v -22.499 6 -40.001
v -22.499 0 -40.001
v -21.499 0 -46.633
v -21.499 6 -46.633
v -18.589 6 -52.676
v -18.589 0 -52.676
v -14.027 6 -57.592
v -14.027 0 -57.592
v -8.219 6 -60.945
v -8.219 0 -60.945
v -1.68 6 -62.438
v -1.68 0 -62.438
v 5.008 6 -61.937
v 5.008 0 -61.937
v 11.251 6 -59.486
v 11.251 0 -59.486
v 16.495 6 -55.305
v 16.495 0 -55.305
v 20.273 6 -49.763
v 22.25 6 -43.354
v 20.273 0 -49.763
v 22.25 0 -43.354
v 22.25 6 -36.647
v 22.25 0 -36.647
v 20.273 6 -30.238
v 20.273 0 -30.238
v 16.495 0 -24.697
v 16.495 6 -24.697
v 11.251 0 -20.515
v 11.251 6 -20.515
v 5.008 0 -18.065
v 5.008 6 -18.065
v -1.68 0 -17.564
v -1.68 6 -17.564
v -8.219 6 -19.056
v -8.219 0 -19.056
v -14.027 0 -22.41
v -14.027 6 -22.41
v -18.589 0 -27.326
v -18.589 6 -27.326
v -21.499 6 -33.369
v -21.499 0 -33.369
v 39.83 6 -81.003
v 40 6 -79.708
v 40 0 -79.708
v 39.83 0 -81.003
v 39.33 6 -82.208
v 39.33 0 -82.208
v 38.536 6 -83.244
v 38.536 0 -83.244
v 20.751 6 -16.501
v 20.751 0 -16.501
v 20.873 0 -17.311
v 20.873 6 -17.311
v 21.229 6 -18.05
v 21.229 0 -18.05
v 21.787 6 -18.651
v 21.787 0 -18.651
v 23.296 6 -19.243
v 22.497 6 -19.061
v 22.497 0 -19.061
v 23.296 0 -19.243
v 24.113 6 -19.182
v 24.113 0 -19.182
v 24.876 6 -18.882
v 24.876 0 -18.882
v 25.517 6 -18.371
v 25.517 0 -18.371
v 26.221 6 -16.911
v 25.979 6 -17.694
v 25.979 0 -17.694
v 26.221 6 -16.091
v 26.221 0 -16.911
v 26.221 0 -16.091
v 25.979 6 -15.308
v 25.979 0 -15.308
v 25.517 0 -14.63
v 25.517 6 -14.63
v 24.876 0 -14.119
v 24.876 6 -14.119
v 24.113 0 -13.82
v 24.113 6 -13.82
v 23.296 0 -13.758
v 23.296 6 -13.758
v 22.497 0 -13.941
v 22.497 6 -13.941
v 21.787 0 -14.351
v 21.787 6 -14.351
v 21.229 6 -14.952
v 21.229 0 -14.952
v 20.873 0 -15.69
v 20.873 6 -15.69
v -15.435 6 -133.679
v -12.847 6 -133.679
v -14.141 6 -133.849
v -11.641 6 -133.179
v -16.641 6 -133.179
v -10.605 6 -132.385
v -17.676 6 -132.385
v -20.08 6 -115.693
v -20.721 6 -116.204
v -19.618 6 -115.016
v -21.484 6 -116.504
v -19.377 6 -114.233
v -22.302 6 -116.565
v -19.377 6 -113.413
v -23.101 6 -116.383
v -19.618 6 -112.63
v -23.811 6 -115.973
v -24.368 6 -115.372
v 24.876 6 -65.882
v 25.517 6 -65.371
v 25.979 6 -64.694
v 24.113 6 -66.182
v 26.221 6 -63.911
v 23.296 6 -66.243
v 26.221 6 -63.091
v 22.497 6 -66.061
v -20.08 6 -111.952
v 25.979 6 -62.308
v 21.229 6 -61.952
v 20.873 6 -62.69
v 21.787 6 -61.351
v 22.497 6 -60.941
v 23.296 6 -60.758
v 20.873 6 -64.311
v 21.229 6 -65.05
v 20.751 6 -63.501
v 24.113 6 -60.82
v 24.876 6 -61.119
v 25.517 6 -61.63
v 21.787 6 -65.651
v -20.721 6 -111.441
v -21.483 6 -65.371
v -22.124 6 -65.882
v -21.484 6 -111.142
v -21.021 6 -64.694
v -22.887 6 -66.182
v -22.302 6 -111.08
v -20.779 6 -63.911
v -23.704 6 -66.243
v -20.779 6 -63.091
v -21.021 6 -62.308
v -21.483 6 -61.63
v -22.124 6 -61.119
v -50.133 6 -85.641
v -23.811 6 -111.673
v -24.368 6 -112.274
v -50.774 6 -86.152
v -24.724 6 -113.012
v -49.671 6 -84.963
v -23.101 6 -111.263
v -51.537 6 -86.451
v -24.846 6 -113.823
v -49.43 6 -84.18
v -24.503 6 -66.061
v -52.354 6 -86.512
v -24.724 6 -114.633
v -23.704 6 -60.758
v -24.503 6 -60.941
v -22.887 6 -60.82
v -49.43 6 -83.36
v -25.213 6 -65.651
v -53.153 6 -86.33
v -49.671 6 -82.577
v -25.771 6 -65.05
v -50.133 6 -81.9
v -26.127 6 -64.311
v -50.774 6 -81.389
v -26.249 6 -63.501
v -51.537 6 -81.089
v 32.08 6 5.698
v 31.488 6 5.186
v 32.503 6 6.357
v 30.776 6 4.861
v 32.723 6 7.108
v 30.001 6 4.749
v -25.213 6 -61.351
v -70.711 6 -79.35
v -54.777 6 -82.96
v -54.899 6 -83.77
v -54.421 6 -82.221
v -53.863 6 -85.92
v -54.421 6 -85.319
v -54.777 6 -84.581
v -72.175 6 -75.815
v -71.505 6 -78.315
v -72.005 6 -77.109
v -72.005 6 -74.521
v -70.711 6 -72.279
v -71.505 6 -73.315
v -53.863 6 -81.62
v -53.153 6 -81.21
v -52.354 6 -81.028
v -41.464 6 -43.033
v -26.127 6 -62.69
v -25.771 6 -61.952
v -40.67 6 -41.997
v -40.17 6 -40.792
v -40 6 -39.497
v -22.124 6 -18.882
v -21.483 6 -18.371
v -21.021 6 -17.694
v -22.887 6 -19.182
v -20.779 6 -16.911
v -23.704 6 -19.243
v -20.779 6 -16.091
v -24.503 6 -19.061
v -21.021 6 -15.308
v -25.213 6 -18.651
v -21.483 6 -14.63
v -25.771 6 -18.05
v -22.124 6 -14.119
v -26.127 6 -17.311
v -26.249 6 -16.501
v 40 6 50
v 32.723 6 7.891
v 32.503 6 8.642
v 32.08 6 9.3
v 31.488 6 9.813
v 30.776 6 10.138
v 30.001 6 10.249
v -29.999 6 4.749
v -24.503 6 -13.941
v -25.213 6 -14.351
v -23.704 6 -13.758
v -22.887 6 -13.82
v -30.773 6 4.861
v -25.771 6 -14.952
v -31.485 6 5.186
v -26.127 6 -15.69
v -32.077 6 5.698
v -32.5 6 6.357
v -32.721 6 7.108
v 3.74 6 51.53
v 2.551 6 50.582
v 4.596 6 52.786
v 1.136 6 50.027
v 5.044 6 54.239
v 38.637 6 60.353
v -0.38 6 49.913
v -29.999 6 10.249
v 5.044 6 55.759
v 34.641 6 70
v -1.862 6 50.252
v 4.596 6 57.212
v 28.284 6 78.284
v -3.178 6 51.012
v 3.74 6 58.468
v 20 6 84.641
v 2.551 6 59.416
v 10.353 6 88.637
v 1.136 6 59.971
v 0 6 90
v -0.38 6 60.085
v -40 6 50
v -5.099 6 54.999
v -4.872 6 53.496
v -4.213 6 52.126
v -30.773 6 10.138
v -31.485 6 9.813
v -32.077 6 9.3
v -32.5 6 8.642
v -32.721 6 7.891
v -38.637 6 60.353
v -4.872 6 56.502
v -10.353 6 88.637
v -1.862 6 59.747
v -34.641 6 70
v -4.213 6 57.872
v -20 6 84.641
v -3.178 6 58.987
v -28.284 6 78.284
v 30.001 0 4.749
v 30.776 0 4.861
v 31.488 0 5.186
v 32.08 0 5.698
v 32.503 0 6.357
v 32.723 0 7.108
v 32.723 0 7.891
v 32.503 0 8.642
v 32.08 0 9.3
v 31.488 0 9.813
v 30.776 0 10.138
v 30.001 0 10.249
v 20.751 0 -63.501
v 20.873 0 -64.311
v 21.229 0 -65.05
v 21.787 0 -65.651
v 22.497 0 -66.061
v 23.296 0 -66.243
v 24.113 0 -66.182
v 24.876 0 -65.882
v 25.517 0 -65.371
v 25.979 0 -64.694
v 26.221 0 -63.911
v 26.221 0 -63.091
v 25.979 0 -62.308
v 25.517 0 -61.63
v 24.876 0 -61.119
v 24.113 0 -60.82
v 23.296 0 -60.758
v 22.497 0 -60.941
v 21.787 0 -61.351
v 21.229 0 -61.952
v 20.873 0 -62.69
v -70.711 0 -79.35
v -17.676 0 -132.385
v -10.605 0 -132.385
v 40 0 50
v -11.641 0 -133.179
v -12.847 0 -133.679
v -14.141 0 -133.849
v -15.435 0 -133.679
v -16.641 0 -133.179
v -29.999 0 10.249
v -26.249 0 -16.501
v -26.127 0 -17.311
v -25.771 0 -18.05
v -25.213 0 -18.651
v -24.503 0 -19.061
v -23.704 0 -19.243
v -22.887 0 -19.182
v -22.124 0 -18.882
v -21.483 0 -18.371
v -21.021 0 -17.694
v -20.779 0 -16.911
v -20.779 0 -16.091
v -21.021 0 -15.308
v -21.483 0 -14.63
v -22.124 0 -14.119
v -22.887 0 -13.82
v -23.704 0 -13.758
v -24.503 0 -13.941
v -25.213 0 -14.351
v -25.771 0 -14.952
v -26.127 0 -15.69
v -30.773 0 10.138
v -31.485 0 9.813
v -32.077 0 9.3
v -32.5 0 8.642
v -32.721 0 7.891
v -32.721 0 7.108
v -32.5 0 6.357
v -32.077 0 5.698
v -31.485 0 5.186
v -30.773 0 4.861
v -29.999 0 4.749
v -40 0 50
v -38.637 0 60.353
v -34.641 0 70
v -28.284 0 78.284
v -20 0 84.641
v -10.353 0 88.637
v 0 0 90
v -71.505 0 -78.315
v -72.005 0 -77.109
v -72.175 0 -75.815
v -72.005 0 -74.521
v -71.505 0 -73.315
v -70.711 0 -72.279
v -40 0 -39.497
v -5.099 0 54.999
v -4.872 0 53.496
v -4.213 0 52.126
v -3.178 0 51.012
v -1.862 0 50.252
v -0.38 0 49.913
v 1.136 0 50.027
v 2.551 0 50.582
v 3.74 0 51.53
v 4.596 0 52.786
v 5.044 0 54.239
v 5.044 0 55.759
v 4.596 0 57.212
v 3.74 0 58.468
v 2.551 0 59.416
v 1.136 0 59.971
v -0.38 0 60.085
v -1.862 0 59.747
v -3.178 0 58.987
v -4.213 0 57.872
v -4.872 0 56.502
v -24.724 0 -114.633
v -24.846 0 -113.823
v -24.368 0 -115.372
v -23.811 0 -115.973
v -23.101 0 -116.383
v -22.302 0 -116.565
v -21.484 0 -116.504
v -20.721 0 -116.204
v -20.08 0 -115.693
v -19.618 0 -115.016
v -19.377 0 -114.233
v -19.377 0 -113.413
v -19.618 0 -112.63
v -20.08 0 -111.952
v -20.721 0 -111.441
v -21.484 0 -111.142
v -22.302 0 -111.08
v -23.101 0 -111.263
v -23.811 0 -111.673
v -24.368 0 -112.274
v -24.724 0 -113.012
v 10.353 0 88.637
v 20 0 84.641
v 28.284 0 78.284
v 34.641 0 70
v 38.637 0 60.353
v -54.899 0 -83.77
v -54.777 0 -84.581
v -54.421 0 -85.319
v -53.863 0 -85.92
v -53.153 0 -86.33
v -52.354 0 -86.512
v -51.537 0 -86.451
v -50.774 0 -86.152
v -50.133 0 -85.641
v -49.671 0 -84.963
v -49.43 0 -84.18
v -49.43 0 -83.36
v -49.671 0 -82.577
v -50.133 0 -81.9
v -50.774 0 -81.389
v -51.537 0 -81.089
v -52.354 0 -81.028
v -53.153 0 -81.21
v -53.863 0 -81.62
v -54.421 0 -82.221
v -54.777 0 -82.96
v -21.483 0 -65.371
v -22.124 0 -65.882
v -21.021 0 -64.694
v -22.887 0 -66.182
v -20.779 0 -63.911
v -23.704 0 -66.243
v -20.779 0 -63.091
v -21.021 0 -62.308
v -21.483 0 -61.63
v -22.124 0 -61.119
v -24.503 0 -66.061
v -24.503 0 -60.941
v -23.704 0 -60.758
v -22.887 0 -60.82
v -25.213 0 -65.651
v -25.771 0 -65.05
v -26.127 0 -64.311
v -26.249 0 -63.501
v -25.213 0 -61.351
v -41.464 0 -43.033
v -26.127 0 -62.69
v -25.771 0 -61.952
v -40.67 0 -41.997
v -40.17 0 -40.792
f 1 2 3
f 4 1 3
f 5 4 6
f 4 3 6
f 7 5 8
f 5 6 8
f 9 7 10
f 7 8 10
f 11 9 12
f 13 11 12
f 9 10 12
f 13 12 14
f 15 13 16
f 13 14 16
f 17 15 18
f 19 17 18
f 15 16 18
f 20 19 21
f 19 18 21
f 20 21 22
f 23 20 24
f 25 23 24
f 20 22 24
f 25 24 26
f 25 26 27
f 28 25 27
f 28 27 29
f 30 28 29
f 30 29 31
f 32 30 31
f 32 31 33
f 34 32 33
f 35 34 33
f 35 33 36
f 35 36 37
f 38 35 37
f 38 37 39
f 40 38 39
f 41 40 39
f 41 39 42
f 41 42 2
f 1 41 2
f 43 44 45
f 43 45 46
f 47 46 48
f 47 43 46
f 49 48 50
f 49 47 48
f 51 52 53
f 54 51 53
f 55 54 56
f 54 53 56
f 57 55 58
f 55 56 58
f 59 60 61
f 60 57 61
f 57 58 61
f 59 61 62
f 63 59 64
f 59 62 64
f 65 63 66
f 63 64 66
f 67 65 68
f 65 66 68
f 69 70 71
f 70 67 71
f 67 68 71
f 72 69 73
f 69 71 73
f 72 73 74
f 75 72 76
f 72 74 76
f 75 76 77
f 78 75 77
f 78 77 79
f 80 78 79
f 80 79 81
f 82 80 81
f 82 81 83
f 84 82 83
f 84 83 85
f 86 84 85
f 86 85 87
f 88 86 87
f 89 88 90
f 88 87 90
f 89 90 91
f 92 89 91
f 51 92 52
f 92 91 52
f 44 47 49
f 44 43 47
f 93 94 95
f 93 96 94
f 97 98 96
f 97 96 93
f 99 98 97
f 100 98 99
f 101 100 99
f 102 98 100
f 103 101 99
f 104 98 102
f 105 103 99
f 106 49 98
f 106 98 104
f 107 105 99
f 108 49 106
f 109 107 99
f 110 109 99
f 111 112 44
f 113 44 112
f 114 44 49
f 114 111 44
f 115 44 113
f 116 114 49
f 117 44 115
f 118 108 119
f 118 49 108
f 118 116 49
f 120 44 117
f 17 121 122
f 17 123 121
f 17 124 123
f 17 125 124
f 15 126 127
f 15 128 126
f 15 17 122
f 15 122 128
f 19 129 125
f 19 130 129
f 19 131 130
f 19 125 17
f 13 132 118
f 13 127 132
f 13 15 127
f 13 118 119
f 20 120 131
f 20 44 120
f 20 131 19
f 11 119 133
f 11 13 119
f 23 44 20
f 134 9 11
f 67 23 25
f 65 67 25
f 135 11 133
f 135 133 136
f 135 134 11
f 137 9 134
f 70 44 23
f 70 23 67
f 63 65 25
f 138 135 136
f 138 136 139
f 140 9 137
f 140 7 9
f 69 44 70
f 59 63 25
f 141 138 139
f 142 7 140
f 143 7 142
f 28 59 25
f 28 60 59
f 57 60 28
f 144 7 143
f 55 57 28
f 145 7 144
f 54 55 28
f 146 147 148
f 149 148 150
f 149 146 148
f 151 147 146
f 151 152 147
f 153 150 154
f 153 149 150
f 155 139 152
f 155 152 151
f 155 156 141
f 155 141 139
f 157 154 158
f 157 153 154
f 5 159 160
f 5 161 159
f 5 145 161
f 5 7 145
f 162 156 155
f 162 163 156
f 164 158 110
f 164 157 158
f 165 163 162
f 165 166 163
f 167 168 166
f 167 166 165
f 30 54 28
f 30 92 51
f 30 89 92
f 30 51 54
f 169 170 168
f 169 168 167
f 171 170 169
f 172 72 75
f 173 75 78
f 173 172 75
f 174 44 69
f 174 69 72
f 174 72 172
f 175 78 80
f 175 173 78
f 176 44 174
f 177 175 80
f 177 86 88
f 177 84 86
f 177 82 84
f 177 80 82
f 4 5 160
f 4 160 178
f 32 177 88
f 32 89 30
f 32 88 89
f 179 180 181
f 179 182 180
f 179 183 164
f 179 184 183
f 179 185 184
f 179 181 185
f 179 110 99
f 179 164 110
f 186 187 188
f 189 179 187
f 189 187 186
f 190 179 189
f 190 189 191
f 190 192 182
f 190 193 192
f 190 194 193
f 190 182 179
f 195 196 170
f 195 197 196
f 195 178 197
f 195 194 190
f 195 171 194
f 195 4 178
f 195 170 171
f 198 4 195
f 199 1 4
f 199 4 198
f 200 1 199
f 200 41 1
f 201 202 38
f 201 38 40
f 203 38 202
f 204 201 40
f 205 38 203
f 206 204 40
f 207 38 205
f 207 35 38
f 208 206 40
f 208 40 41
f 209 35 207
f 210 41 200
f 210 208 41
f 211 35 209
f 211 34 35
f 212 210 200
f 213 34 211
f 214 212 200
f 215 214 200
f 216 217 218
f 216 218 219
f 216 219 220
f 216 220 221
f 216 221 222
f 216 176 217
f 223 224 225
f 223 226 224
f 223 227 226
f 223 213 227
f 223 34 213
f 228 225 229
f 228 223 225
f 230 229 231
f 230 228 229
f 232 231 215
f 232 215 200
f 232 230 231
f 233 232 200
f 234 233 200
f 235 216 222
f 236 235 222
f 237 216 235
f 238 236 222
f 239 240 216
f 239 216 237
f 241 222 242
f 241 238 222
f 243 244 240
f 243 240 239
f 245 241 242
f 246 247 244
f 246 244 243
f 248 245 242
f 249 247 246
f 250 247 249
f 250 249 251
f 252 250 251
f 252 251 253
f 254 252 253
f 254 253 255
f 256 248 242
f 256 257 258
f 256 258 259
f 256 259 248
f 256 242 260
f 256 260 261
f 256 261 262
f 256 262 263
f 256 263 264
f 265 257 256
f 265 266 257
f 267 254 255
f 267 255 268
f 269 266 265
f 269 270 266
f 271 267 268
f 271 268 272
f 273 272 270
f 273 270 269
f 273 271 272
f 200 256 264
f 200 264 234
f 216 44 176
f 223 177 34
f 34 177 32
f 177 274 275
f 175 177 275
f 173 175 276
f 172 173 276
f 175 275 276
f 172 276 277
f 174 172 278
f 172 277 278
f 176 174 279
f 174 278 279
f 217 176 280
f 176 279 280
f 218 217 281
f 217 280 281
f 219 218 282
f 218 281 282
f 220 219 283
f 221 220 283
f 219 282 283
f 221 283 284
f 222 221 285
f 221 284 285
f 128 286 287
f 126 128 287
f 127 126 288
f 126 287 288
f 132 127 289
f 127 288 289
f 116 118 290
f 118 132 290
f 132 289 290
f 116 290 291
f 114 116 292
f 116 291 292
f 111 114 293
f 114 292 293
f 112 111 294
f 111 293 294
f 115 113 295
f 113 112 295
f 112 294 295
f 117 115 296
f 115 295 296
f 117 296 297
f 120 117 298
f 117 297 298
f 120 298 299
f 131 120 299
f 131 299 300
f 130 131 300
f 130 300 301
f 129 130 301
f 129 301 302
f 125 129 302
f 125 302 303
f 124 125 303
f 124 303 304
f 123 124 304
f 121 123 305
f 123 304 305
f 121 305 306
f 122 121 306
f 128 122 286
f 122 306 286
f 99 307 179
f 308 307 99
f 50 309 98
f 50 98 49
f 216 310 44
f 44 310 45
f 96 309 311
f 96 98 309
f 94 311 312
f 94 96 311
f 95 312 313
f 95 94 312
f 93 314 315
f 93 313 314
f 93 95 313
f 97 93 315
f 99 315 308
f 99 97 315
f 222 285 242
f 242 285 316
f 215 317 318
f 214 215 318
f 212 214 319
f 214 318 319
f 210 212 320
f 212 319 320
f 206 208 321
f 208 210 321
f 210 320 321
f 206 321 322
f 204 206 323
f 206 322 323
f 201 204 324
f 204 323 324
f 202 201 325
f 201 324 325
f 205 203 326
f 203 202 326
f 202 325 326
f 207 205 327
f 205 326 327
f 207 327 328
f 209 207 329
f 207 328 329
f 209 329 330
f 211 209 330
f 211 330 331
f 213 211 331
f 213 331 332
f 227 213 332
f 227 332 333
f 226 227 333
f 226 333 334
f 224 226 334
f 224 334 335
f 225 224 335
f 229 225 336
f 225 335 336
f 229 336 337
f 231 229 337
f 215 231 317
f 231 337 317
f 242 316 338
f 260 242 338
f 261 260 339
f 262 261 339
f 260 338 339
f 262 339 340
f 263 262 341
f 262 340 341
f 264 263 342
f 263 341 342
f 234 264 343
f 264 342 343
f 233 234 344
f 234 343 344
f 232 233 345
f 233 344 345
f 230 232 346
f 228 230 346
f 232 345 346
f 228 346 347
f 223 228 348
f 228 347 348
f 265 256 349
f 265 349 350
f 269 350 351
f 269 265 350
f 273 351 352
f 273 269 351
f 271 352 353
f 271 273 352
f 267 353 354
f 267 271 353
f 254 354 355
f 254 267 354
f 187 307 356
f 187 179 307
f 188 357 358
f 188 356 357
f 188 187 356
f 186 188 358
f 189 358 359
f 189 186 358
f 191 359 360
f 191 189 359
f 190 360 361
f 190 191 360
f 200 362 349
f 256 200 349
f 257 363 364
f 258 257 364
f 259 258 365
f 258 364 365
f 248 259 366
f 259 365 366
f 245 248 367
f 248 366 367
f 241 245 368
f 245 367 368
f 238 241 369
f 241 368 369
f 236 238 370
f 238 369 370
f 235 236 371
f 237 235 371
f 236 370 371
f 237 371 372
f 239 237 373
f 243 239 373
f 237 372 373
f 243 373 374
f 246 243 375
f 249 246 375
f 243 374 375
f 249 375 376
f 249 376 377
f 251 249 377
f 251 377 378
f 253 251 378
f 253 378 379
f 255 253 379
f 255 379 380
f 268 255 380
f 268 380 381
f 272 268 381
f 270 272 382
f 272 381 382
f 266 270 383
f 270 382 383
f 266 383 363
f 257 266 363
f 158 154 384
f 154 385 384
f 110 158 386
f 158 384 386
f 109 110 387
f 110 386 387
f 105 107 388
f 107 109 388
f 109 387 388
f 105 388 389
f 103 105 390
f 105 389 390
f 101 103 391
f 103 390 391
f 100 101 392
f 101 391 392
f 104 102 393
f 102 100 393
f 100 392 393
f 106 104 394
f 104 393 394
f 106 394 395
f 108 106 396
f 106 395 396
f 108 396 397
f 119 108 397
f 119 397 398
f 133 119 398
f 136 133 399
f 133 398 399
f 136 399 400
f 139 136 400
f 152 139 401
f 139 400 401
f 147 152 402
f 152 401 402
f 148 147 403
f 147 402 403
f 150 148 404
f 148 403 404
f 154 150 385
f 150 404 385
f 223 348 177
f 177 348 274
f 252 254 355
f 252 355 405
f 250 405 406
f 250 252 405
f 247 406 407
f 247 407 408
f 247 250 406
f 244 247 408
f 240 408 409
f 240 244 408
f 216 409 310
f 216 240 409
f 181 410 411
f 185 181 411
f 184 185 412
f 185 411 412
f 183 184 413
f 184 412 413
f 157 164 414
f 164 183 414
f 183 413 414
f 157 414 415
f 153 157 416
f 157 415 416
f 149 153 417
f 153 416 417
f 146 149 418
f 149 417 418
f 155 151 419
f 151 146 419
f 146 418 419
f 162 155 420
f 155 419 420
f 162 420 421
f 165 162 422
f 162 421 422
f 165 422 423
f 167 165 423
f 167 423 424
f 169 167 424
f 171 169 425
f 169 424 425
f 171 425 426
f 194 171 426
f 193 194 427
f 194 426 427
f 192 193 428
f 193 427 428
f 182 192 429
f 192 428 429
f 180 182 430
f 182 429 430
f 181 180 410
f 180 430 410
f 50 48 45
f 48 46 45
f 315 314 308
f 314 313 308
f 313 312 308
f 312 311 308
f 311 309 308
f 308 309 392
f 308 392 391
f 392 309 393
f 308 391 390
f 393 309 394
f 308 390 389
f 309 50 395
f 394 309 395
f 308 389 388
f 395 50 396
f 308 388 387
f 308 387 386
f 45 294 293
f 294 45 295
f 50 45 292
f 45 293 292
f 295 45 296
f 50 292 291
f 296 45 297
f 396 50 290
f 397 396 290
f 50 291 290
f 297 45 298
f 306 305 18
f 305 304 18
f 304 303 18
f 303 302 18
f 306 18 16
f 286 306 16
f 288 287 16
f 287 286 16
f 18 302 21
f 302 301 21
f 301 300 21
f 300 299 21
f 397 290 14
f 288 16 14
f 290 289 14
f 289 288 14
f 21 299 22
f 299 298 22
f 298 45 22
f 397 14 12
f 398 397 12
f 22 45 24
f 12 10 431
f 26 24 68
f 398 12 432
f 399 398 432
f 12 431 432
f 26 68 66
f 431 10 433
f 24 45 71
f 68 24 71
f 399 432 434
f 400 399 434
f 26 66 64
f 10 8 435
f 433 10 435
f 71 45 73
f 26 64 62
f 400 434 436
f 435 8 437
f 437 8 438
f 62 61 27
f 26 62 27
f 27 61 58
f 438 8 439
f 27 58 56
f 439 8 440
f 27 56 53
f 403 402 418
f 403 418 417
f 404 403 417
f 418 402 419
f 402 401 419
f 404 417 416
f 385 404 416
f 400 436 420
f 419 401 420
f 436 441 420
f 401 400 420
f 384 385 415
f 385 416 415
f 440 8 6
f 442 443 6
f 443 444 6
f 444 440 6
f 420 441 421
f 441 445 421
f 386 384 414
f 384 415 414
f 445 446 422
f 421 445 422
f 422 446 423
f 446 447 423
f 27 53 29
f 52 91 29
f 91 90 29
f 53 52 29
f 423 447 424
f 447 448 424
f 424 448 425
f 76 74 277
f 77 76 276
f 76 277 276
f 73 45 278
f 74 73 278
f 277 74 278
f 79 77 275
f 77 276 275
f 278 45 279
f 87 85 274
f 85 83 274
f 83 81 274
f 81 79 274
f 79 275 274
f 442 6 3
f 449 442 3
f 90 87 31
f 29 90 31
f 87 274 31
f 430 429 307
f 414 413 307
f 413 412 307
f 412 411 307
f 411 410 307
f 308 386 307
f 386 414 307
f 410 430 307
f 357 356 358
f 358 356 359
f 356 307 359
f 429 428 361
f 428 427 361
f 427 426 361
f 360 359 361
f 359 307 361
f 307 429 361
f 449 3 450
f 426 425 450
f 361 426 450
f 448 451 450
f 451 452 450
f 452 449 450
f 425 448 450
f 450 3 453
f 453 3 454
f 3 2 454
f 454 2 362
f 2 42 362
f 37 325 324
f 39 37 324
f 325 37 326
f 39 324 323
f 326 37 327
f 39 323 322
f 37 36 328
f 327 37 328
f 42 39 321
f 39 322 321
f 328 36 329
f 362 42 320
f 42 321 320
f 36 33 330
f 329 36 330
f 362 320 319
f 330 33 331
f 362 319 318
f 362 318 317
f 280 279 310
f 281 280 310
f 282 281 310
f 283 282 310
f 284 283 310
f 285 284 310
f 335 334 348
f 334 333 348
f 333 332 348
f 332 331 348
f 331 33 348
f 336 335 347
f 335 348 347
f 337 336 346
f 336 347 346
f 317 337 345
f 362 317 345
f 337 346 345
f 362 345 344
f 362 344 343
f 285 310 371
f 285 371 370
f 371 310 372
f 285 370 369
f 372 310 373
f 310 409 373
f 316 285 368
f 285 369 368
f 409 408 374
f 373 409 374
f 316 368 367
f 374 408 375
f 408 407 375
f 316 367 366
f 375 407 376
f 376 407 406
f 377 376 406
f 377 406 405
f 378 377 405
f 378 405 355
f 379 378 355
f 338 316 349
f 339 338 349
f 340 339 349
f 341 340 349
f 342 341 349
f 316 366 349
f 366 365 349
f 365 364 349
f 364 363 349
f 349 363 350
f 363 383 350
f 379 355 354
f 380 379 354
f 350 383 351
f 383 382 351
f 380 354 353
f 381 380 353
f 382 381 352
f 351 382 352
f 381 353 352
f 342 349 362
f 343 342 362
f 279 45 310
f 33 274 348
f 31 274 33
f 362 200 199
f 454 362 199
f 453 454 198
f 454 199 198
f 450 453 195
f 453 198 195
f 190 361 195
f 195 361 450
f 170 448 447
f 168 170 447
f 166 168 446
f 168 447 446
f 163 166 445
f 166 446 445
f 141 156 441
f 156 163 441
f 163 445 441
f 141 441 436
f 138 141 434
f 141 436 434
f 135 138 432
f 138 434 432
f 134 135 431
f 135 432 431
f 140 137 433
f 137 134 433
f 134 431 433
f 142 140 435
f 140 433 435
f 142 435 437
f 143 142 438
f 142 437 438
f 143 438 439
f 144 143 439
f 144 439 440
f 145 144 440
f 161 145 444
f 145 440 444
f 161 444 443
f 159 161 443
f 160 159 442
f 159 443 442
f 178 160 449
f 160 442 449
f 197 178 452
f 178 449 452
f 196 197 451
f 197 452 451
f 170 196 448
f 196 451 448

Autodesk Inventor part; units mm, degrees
ref_plane "YZ Plane" through (0, 0, 0) normal (1, 0, 0) x (0, 1, 0)
ref_plane "XZ Plane" through (0, 0, 0) normal (0, 1, 0) x (-1, 0, 0)
sketch "Sketch1" plane through (0, 0, 0) normal (0, 1, 0) x (-1, 0, 0)
  line L0 (40, 90) -> (-40, 90)
  line L1 (-40, 90) -> (-40, -81.7795)
  line L2 (40, -41.5685) -> (40, 90)
  line L3 (40, 90) -> (-40, -90) construction
  line L4 (-40, 90) -> (40, -90) construction
  circle A0 centre (-0.0013, 54.9992) radius 5.1
  line L5 (23.4987, -16.5008) -> (-23.5013, -16.5008) construction
  line L6 (-23.5013, -16.5008) -> (-23.5013, -63.5008) construction
  line L7 (-23.5013, -63.5008) -> (23.4987, -63.5008) construction
  line L8 (23.4987, -63.5008) -> (23.4987, -16.5008) construction
  line L9 (23.4987, -16.5008) -> (-23.5013, -63.5008) construction
  line L10 (-23.5013, -16.5008) -> (23.4987, -63.5008) construction
  circle A1 centre (23.4987, -16.5008) radius 2.75
  circle A2 centre (23.4987, -63.5008) radius 2.75
  circle A3 centre (-23.5013, -16.5008) radius 2.75
  circle A4 centre (-23.5013, -63.5008) radius 2.75
  line L11 (-0.0013, -90.0008) -> (-0.0013, -80) construction
  line L12 (19.9987, -11.0008) -> (-20.0013, -11.0008) construction
  line L13 (-20.0013, -11.0008) -> (-20.0013, -69.0008) construction
  line L14 (-20.0013, -69.0008) -> (19.9987, -69.0008) construction
  line L15 (19.9987, -69.0008) -> (19.9987, -11.0008) construction
  line L16 (19.9987, -11.0008) -> (-20.0013, -69.0008) construction
  line L17 (-20.0013, -11.0008) -> (19.9987, -69.0008) construction
  line L18 (-29.0013, -60.0008) -> (28.9987, -60.0008) construction
  line L19 (28.9987, -60.0008) -> (28.9987, -20.0008) construction
  line L20 (28.9987, -20.0008) -> (-29.0013, -20.0008) construction
  line L21 (-29.0013, -20.0008) -> (-29.0013, -60.0008)
  line L22 (-29.0013, -60.0008) -> (28.9987, -20.0008) construction
  line L23 (28.9987, -60.0008) -> (-29.0013, -20.0008) construction
  line L24 (-0.0013, 54.9992) -> (102.5291, -47.5313) construction
  line L25 (-0.0013, 54.9992) -> (144.9987, 54.9992) construction
  line L26 (28.2843, 83.2843) -> (-28.2843, 26.7157) construction
  line L27 (-28.2843, 26.7157) -> (74.2462, -75.8148) construction
  line L28 (74.2462, -75.8148) -> (130.8148, -19.2462) construction
  line L29 (130.8148, -19.2462) -> (28.2843, 83.2843) construction
  line L30 (28.2843, 83.2843) -> (74.2462, -75.8148) construction
  line L31 (-28.2843, 26.7157) -> (130.8148, -19.2462) construction
  line L32 (74.2462, -75.8148) -> (14.1407, -135.9202)
  line L33 (14.1407, -135.9202) -> (-0.0014, -121.7781)
  line L34 (-0.0014, -121.7781) -> (-31.7795, -90)
  line L35 (74.2462, -75.8148) -> (40, -41.5685)
  line L36 (-31.7795, -90) -> (-40, -81.7795)
  line L37 (44.1935, -105.8675) -> (37.1224, -98.7964)
  line L38 (37.1224, -98.7964) -> (52.1488, -83.7701) construction
  line L39 (37.1224, -98.7964) -> (22.096, -113.8228) construction
  circle A5 centre (52.1488, -83.7701) radius 2.75
  circle A6 centre (22.096, -113.8228) radius 2.75
  line L40 (-0.0013, 54.9992) -> (-0.0013, -40.0008)
  circle A7 centre (-0.0013, -40.0008) radius 22.5
  point P0 (0, 0)
  point P1 (51.2639, 3.7339)
  dimension "d0" = 80
  dimension "d1" = 180
  dimension "d3" = 10.2
  dimension "d5" = 47
  dimension "d6" = 47
  dimension "d7" = 5.5
  dimension "d8" = 5.5
  dimension "d9" = 5.5
  dimension "d10" = 5.5
  dimension "d12" = 40
  dimension "d13" = 58
  dimension "d14" = 58
  dimension "d15" = 40
  dimension "d27" = 45
  dimension "d28" = 145
  dimension "d29" = 80
  dimension "d30" = 145
  dimension "d31" = 85.002
  dimension "d32" = 20
  dimension "d33" = 10
  dimension "d35" = 21.2505
  dimension "d36" = 21.2505
  dimension "d37" = 5.5
  dimension "d38" = 5.5
  dimension "d53" = 95
  dimension "d54" = 45
extrude "Plate3" add sketch "Sketch1" along normal blind 6
fillet "Fillet6" radius 5 4 edges at (-40, 3, -41.5685) (-74.2462, 3, -75.8148) (-14.1407, 3, -135.9202) (40, 3, -81.7795)
fillet "Fillet7" radius 40 2 edges at (40, 3, 90) (-40, 3, 90)
sketch "Sketch2" plane through (0, 0, 0) normal (0, -1, 0) x (1, 0, 0)
  circle A0 centre (0.0013, 54.9992) radius 5.1 projected
  line L0 (0.0013, 54.9992) -> (0.0013, -40.0008) construction
  line L1 (0.0013, 7.4992) -> (55.0013, 7.4992) construction
  line L2 (0.0013, 7.4992) -> (-54.9987, 7.4992) construction
  line L3 (-29.9987, 7.4992) -> (30.0013, 7.4992) construction
  line L4 (-29.9987, 4.7492) -> (30.0013, 4.7492)
  line L5 (30.0013, 10.2492) -> (-29.9987, 10.2492)
  arc A1 (-29.9987, 10.2492) -> (-29.9987, 4.7492) centre (-29.9987, 7.4992) ccw
  arc A2 (30.0013, 4.7492) -> (30.0013, 10.2492) centre (30.0013, 7.4992) ccw
  point P0 (0, 0)
  dimension "d43" = 95
  dimension "d44" = 55
  dimension "d45" = 55
  dimension "d46" = 30
  dimension "d47" = 5.5
extrude "Extrusion1" cut sketch "Sketch2" against normal blind 10 contours A1 L5 A2 L4
ref_plane "Work Plane2" through (30.0013, 0, 7.4992) normal (0, 0, -1) x (-1, 0, 0)
equation "\"d39\" = Thickness"
equation "\"BendRadius\" = Thickness"
equation "\"BendReliefWidth\" = Thickness"
equation "\"BendReliefDepth\" = 0.5 * Thickness"
equation "\"CornerReliefSize\" = 4 * Thickness"
equation "\"MinimumRemnant\" = 2 * Thickness"
equation "\"TransitionRadius\" = BendRadius"
equation "\"JacobiRadiusSize\" = BendRadius"
equation "\"GapSize\" = Thickness"
equation "\"Thickness\" = 6"
properties part number "NEMA23MountPlatev2" material "Aluminum 6061"
